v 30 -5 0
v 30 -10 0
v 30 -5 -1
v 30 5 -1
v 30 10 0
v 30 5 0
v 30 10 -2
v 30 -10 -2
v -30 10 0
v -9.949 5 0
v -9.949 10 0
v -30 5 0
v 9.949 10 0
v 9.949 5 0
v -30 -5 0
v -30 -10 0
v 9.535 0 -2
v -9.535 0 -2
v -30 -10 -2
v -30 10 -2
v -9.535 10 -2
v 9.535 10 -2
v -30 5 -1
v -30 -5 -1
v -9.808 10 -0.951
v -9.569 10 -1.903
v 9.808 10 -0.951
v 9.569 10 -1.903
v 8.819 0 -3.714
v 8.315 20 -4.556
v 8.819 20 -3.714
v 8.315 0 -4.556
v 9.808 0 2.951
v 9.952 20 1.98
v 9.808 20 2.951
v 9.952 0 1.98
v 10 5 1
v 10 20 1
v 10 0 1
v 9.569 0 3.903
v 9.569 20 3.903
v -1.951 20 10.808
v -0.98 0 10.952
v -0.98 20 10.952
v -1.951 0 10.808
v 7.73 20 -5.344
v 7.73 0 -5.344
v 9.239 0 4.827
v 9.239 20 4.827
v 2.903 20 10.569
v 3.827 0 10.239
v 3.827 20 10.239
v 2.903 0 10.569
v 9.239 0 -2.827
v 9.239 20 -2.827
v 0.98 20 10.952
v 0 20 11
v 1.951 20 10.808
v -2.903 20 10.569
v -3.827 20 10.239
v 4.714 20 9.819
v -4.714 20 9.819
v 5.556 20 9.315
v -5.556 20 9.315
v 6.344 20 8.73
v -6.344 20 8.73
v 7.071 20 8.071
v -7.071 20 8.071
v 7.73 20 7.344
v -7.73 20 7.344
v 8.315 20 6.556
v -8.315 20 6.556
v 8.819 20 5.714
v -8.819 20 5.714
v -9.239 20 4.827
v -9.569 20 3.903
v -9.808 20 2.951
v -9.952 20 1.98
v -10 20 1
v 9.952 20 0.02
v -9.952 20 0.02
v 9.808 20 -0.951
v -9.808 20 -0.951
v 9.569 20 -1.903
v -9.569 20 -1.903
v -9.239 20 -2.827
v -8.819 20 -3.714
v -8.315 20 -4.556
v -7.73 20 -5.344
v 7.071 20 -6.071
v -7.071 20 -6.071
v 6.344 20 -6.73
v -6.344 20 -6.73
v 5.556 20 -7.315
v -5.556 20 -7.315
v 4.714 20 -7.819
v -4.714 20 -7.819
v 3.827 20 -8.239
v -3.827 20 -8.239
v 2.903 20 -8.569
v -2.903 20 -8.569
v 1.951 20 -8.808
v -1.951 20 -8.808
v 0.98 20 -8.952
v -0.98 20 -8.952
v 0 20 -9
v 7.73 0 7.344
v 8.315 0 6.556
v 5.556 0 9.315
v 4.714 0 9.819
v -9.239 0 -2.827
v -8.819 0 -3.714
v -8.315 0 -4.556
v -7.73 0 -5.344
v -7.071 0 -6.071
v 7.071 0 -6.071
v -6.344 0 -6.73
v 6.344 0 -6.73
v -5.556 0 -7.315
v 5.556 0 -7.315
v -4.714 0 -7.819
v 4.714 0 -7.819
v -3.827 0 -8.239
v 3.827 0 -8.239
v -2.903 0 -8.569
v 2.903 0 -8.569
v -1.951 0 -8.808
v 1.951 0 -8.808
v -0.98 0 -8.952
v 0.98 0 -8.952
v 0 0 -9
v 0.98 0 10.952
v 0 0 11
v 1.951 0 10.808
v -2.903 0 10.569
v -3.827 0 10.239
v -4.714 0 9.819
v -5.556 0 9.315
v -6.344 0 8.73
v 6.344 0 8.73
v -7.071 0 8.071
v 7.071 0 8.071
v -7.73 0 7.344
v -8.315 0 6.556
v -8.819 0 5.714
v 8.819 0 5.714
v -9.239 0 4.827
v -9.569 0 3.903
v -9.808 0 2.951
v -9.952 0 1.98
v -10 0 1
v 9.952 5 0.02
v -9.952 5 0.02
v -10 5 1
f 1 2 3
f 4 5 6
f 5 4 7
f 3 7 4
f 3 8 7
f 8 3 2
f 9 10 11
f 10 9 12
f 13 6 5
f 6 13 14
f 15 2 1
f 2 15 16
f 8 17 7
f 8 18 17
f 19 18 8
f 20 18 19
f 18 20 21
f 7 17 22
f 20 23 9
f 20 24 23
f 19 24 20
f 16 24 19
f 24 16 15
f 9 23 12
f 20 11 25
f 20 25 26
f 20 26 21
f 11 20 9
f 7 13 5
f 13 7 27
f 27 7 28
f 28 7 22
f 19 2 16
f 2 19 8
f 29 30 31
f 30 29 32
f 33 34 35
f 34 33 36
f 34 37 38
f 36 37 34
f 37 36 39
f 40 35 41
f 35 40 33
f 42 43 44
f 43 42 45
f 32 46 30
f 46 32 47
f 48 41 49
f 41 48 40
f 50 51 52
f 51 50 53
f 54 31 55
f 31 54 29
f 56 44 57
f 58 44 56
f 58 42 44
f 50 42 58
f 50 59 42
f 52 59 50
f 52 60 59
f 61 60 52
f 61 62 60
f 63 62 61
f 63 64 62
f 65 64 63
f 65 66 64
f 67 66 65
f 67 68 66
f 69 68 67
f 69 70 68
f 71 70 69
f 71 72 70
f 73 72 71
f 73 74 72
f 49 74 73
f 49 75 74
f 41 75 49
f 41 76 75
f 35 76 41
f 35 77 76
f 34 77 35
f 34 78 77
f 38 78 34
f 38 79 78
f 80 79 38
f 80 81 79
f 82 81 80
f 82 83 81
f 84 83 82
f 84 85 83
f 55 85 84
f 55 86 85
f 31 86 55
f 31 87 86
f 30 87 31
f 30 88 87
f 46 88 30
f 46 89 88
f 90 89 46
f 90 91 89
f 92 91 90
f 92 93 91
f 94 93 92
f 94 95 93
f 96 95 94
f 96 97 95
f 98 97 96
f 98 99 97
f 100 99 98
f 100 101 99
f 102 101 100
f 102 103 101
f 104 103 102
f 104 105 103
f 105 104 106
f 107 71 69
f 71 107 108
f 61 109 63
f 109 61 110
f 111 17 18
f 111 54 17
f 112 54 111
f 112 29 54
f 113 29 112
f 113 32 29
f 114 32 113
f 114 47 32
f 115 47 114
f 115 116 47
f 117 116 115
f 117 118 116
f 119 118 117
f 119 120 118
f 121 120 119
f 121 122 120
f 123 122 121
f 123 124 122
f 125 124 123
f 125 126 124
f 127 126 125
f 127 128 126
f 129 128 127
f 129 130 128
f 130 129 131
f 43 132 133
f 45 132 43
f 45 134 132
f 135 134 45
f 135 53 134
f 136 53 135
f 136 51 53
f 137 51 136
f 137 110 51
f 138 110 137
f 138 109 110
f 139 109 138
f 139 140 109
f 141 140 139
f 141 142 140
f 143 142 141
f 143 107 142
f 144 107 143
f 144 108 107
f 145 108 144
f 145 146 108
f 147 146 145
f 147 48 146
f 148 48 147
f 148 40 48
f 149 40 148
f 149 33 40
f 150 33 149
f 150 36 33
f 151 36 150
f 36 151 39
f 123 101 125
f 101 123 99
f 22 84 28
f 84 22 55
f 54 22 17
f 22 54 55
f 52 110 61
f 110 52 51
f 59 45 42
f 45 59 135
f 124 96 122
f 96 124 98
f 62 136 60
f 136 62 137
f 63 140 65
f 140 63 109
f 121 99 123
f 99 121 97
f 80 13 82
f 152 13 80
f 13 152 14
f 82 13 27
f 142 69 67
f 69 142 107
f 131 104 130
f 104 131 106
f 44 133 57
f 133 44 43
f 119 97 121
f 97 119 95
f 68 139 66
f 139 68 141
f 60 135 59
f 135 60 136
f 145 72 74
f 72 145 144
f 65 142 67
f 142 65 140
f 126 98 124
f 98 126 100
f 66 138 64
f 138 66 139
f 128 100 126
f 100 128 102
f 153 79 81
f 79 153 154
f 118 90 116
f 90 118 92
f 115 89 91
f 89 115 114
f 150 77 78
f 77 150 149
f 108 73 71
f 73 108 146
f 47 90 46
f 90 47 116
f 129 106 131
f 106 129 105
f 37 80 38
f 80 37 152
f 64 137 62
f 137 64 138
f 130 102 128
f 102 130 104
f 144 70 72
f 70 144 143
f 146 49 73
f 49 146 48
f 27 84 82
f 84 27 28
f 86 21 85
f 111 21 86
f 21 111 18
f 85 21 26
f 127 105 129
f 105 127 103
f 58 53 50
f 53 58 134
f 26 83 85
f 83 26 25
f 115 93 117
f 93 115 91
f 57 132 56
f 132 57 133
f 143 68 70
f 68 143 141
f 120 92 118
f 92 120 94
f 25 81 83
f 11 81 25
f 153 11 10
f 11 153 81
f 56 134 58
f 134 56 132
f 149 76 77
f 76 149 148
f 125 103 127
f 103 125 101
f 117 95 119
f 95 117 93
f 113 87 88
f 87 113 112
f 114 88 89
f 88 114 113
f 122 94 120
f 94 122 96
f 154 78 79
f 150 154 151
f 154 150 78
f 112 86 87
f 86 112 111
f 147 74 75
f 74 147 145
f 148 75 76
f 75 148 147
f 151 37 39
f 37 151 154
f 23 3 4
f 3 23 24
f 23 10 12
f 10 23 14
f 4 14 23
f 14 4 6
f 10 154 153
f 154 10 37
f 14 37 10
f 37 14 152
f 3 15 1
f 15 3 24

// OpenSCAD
module swiss_clip() {
    difference() {
        union() {
            // Main body of the clip
            translate([0, 0, -1])
                cube([60, 20, 2], center=true);
            
            // Curved top part
            translate([0, 10, 1])
                rotate([90, 0, 0])
                cylinder(h=20, r=10, center=true, $fn=64);
        }
        
        // Cutout for the clip
        translate([0, 0, 0])
            cube([60, 10, 2], center=true);
    }
}

swiss_clip();
